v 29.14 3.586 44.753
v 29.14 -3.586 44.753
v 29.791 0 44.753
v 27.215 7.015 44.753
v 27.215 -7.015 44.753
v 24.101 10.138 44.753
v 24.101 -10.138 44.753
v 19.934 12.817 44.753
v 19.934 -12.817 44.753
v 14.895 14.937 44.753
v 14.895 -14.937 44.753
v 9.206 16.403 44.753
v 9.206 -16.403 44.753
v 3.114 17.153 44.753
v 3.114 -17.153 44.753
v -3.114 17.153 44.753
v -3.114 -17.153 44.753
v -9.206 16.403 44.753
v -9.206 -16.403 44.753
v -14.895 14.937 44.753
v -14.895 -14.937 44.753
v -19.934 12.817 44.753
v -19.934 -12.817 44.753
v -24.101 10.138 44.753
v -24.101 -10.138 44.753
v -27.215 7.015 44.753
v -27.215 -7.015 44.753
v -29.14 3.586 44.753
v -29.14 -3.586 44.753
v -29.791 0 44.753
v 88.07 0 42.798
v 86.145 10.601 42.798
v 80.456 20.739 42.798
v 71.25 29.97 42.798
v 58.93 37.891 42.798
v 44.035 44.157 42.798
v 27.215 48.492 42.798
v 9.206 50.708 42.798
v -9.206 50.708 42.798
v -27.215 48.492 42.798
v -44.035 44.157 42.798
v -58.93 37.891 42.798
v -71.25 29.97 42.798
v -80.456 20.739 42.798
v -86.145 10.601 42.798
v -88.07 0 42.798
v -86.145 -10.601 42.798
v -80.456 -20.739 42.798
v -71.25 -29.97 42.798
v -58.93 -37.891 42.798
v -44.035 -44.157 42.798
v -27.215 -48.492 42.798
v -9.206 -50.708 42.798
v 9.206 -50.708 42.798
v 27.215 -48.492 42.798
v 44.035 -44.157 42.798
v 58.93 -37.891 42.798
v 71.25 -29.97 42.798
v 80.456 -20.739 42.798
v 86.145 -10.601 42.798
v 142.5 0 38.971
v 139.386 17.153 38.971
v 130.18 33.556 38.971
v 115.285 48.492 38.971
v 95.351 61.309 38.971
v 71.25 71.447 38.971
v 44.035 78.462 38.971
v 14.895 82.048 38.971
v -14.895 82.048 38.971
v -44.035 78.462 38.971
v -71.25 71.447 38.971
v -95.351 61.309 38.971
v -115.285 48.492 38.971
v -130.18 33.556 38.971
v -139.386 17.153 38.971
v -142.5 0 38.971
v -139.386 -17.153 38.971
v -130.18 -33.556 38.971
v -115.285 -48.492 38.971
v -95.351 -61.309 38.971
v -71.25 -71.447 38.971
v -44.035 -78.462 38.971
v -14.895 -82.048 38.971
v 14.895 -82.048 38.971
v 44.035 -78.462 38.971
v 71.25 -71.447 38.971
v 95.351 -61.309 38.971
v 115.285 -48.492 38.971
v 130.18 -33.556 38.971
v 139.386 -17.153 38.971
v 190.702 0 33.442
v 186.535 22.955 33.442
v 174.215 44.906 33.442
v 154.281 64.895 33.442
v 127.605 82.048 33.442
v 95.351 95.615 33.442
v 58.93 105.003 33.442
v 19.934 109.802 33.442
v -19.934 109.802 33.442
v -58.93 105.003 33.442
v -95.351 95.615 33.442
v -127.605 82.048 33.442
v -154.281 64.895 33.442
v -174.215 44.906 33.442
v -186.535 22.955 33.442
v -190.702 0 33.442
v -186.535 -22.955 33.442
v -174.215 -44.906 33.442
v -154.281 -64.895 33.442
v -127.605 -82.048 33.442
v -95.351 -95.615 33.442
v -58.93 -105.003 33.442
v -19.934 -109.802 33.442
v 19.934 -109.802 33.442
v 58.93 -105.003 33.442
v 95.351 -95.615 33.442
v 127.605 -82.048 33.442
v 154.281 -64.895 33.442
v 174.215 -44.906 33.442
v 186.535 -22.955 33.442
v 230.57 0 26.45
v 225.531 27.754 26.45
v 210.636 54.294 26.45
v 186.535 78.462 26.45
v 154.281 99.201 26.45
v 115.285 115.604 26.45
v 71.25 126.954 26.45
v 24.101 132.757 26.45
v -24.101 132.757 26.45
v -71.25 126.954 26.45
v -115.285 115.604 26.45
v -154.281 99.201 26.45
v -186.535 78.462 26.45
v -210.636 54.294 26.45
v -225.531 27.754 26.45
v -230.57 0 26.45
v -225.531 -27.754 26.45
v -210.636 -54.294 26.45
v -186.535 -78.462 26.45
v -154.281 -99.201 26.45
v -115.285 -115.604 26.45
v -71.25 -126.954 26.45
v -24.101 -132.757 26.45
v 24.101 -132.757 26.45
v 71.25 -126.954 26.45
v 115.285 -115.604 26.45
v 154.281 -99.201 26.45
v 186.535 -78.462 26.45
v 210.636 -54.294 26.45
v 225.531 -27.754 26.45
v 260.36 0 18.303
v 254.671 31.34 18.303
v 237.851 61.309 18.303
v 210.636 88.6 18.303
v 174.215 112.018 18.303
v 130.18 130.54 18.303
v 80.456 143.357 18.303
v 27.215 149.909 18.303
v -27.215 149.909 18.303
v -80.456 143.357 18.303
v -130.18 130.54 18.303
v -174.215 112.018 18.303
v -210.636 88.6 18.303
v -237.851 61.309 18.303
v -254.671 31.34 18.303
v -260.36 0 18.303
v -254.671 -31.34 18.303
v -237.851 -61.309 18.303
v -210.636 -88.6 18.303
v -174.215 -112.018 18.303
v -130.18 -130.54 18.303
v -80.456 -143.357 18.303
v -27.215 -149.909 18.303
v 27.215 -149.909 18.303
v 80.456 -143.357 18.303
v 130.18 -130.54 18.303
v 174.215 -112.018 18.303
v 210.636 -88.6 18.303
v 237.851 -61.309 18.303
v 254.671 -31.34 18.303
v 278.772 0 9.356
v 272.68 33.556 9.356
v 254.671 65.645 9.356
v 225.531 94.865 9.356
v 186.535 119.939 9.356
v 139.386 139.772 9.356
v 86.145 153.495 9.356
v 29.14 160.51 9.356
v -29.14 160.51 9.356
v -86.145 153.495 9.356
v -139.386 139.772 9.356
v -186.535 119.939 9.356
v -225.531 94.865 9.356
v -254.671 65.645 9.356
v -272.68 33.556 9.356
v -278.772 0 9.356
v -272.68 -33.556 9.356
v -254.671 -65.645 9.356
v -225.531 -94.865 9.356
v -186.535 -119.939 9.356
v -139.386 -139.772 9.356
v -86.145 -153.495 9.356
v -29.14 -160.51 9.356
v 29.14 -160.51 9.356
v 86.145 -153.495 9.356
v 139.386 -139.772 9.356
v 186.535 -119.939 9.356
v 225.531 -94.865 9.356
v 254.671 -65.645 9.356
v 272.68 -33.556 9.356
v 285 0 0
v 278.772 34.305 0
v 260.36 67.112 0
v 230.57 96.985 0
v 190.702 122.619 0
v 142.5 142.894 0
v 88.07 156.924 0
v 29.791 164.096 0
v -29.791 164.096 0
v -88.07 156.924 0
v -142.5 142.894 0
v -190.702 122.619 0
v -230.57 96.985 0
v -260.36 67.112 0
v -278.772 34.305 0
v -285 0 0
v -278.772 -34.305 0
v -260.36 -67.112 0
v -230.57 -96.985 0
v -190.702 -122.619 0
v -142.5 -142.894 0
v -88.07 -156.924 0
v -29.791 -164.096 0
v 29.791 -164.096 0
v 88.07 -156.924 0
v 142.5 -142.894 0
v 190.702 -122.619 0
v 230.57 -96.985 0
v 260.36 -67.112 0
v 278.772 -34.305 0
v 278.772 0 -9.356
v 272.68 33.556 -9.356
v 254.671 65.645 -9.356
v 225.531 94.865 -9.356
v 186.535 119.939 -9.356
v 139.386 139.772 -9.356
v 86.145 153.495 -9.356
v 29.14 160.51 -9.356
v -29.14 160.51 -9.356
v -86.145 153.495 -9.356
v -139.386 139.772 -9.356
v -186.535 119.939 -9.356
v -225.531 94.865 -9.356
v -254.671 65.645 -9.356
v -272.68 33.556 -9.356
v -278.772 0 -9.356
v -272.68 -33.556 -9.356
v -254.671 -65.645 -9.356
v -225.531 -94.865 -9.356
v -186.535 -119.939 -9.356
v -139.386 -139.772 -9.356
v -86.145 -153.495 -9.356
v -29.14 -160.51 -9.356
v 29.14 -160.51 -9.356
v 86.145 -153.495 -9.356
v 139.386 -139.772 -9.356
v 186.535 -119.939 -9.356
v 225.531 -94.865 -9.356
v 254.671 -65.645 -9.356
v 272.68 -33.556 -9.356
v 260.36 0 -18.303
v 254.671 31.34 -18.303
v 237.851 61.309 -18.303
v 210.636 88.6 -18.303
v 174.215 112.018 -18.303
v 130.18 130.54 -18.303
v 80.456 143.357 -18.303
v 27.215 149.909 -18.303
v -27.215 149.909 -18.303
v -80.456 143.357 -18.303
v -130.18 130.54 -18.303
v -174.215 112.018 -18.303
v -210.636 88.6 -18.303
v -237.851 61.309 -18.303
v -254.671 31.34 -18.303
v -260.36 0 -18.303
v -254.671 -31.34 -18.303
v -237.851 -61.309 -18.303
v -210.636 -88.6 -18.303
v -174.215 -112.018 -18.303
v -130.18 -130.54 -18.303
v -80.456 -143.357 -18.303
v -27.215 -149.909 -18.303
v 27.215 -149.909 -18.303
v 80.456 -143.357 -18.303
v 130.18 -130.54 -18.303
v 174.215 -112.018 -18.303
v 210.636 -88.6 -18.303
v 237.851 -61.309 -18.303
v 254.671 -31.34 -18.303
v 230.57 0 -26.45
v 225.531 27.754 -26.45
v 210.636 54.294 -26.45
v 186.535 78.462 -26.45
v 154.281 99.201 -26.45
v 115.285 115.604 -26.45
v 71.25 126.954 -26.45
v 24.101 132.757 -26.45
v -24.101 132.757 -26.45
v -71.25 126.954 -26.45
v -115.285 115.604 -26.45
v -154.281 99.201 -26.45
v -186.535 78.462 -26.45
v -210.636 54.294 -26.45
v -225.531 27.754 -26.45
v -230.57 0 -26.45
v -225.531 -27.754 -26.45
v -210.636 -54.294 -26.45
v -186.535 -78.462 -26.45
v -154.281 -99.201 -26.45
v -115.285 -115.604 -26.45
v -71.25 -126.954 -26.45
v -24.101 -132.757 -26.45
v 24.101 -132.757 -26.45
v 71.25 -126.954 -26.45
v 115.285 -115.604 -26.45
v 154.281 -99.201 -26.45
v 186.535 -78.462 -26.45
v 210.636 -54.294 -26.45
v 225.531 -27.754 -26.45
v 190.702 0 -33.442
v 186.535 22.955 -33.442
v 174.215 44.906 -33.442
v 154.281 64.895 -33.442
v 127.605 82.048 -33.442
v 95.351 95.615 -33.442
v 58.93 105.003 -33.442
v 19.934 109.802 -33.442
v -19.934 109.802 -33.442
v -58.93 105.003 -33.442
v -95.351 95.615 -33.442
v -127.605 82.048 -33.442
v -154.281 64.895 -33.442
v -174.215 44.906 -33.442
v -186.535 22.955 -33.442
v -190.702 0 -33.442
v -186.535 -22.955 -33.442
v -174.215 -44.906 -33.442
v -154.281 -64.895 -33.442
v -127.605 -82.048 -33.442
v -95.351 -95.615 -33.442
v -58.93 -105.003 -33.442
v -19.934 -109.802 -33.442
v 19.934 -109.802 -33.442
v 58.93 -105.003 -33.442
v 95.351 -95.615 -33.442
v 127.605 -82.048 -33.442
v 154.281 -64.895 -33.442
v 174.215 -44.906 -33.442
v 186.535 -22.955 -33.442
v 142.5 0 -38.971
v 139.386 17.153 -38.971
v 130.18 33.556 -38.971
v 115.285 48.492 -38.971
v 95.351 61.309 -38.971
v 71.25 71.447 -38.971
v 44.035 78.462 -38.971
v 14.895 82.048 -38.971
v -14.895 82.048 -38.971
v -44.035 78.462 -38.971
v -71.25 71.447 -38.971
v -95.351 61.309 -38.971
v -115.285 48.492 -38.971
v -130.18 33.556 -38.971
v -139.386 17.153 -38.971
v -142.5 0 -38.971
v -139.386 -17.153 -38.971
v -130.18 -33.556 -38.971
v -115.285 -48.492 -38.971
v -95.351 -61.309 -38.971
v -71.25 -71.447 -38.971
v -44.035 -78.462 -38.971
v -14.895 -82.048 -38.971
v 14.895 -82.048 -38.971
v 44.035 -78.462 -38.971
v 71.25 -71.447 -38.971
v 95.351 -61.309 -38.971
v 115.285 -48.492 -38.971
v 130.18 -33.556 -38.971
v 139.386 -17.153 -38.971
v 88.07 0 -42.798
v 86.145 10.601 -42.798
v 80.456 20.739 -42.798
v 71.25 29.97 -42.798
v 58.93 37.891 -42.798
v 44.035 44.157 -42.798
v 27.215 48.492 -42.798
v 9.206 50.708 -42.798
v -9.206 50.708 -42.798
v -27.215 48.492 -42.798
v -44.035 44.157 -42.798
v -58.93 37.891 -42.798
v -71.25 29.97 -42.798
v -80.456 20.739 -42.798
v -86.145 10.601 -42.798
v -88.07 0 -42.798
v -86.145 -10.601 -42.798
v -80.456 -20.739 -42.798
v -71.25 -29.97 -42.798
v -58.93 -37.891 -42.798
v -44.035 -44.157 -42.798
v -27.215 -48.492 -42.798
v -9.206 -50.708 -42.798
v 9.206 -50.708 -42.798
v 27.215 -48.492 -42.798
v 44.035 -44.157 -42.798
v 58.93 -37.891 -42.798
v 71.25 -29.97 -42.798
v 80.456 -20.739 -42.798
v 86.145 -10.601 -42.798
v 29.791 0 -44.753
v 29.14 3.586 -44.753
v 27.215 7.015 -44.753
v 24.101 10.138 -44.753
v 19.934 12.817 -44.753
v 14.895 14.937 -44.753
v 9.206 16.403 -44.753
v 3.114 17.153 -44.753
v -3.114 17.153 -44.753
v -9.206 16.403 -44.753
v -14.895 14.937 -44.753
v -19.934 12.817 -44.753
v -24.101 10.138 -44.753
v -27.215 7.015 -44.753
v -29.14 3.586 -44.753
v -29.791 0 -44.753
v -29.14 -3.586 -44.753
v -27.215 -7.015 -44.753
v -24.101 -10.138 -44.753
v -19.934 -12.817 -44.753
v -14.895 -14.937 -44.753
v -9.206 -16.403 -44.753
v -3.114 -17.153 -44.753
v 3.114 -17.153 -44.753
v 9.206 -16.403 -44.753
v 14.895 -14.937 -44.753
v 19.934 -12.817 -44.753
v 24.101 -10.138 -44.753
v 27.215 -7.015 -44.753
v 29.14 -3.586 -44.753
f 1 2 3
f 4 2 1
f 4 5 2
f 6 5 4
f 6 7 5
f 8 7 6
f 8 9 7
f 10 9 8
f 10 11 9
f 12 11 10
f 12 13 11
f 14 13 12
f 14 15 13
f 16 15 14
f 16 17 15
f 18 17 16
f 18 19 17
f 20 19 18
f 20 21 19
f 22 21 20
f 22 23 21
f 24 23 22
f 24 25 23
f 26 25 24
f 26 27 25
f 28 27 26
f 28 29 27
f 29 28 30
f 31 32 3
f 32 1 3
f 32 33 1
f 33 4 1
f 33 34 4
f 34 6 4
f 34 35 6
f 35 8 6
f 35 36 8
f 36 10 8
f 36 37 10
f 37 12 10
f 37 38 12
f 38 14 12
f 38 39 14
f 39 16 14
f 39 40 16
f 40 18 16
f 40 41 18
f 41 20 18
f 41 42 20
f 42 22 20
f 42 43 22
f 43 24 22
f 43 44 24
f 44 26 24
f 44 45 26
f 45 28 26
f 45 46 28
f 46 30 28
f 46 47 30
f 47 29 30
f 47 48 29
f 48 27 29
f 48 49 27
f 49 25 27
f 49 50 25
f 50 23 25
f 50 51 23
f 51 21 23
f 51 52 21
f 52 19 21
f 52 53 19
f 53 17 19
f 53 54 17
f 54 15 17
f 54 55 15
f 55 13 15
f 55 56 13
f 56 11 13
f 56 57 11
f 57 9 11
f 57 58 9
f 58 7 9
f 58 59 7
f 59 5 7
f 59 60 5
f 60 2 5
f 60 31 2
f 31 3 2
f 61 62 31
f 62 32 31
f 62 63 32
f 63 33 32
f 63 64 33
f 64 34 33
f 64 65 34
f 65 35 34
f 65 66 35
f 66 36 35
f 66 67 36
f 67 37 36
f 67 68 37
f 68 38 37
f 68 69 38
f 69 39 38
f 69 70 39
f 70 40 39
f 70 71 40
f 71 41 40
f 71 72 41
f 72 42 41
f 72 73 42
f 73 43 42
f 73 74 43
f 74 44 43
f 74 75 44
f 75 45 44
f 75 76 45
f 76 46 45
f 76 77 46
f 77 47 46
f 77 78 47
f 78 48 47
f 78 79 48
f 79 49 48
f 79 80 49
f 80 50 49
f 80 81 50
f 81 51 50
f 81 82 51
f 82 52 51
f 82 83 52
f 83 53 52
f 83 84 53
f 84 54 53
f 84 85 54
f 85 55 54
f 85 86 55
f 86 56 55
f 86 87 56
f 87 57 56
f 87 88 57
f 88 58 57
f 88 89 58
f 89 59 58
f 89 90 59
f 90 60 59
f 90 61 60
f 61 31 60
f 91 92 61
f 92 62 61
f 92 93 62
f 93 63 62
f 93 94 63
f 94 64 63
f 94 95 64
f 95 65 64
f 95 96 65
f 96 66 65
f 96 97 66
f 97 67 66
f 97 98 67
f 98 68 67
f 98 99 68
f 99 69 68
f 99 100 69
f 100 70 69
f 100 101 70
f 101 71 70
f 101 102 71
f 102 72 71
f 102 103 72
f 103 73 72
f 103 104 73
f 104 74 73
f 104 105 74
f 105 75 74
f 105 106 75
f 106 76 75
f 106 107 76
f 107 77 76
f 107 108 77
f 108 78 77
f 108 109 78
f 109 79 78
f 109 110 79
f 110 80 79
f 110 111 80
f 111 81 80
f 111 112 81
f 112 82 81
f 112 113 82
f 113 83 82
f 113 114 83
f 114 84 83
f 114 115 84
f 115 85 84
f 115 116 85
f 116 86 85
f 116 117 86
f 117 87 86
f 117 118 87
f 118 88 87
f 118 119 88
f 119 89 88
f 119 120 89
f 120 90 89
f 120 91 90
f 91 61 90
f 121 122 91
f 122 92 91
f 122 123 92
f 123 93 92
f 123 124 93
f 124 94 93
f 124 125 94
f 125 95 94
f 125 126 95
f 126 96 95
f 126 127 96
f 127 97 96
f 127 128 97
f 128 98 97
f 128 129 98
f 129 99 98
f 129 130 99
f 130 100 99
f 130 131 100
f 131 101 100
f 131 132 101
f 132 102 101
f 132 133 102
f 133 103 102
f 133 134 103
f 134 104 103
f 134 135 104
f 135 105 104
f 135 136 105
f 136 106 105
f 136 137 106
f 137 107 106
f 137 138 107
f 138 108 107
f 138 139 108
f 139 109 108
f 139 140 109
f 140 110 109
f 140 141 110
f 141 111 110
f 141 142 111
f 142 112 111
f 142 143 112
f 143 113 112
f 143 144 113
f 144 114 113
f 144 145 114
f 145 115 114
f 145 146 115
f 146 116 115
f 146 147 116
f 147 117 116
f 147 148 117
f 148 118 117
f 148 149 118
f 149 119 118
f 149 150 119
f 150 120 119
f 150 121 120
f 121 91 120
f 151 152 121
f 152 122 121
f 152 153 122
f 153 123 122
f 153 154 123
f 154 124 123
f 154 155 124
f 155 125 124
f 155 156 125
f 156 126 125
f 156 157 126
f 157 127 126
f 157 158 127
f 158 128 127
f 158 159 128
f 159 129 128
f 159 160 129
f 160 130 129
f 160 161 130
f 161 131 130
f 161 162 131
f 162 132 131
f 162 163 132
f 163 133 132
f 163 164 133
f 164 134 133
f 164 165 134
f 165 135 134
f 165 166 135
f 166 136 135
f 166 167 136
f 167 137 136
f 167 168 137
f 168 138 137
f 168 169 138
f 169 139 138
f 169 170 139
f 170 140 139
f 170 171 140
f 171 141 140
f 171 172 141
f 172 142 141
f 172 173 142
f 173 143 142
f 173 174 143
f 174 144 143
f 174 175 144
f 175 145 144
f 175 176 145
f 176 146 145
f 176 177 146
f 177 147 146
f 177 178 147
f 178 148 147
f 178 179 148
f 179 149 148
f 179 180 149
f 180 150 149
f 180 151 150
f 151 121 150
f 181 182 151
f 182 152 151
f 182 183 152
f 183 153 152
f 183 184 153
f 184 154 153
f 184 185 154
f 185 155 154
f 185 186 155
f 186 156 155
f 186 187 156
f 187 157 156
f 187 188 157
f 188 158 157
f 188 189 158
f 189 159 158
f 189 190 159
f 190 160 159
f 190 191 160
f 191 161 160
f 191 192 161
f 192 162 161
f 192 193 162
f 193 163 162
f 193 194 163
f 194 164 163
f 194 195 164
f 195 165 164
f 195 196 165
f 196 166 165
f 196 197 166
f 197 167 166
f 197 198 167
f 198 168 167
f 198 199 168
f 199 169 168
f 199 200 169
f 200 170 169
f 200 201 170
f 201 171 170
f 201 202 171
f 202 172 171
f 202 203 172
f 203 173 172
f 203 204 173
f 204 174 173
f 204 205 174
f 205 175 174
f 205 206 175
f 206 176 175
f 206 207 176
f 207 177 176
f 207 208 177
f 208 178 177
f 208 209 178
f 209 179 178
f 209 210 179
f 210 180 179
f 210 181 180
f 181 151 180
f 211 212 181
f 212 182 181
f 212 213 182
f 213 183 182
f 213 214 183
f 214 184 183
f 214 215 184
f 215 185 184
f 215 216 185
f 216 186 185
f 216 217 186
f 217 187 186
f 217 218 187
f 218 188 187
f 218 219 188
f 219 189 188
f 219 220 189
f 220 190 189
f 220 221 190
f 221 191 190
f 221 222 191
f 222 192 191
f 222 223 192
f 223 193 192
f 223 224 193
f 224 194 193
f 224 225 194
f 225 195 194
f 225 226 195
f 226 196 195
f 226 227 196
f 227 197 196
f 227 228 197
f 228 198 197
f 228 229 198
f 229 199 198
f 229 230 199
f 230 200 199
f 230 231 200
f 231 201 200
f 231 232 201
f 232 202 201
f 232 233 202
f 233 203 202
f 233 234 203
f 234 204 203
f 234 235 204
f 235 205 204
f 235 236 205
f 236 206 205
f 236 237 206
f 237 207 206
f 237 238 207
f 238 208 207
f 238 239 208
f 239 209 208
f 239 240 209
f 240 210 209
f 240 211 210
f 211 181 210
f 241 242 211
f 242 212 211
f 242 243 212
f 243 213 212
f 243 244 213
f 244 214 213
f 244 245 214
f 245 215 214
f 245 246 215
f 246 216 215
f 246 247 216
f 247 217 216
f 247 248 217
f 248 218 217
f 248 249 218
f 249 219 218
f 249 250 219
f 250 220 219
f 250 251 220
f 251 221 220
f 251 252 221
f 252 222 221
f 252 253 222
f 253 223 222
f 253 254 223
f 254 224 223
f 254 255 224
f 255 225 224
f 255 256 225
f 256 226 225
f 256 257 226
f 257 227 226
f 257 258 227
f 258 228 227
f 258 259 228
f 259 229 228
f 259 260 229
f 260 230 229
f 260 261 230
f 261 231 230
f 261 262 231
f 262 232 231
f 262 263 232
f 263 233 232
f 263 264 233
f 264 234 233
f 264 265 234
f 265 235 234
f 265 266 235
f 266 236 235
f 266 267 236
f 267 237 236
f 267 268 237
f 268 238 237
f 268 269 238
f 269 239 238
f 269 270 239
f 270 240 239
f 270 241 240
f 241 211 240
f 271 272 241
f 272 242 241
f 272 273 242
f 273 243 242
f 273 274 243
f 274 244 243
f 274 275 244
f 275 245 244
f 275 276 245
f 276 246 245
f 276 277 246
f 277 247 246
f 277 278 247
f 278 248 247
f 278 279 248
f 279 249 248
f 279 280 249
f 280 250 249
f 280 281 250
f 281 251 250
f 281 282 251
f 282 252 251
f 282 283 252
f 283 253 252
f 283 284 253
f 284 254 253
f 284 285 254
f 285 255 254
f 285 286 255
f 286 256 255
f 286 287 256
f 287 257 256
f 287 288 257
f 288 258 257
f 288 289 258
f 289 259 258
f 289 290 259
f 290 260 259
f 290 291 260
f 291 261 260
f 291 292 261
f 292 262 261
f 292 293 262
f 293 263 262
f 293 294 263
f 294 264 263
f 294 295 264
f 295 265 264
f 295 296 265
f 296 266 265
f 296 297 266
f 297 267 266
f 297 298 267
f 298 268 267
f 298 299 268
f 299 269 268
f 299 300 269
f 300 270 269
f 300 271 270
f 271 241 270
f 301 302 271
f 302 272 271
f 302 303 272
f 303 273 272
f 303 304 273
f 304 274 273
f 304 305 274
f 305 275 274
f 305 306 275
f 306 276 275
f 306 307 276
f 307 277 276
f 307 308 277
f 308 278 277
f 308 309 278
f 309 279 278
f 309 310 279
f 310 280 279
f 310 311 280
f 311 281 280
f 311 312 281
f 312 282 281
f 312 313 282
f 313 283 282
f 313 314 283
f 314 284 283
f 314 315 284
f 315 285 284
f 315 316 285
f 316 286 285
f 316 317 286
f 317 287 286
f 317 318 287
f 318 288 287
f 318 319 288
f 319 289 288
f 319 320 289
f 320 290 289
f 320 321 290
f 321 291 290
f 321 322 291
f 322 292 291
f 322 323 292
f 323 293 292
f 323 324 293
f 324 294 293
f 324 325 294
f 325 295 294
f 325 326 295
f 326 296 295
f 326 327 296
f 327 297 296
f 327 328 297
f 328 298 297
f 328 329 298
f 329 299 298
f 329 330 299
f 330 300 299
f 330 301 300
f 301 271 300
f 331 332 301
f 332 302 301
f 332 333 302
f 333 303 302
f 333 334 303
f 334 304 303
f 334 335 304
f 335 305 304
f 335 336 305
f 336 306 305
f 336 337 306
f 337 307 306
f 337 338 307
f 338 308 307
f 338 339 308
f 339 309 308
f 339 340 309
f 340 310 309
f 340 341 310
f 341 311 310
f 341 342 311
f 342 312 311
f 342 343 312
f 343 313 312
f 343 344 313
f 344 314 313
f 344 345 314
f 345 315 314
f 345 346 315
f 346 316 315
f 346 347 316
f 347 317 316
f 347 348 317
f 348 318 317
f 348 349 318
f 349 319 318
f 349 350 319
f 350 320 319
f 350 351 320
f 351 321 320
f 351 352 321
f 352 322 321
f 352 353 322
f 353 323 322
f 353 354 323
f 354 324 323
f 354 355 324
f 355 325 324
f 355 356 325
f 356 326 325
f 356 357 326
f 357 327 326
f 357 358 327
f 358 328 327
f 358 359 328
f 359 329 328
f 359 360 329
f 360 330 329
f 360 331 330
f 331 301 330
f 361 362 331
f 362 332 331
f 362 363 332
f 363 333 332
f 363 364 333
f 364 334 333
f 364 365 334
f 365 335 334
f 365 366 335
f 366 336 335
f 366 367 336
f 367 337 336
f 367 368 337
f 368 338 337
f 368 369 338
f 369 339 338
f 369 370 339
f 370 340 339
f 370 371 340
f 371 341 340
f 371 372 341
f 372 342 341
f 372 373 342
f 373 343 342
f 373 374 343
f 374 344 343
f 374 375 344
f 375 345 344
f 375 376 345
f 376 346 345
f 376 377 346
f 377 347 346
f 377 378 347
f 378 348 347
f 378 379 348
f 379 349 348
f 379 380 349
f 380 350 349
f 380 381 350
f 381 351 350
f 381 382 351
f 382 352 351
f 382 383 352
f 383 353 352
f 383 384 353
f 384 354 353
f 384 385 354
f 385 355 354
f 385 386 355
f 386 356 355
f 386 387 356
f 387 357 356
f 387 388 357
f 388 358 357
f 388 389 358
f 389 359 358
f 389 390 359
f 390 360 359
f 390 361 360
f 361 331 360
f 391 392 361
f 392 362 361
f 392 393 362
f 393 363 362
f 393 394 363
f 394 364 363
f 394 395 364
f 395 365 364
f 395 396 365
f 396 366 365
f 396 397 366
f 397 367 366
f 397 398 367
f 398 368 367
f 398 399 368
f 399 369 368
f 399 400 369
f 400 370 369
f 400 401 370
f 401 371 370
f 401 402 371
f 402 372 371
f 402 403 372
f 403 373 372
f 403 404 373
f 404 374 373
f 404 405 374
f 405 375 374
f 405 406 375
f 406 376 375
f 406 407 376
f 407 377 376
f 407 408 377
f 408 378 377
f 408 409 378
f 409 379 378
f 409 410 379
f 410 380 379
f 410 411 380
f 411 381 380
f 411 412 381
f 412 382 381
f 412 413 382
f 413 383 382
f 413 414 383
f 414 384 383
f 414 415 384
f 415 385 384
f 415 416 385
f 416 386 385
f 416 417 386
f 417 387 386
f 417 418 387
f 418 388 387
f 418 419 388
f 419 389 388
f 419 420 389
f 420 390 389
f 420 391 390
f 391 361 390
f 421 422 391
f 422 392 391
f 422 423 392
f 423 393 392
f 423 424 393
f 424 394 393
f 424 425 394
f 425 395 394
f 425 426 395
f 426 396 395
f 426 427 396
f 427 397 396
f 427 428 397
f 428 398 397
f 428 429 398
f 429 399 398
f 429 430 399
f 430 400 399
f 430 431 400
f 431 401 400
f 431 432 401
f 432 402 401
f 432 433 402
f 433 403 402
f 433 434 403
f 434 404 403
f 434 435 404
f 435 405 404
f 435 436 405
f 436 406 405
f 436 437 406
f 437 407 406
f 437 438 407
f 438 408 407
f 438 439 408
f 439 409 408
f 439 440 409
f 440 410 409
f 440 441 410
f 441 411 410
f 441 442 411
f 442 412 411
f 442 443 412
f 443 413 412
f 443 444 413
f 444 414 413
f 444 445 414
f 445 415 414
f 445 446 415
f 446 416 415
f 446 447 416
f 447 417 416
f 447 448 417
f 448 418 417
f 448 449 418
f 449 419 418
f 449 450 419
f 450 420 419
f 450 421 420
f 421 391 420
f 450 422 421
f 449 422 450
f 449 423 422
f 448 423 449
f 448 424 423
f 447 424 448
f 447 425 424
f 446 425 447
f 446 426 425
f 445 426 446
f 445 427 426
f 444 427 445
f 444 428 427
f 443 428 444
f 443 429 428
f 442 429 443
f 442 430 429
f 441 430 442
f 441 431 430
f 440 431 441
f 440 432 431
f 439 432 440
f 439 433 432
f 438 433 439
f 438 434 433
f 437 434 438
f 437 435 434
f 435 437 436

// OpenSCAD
// Generated by SolidPython 1.0.1 on 2020-07-29 00:46:54


scale(v = [19, 11, 3]) {
	sphere(r = 15);
}
/***********************************************
*********      SolidPython code:      **********
************************************************
 
# import packages: SolidPython
from solid import *
from solid.utils import *
from itertools import chain, combinations, permutations


class Resize:

    def __init__(self, scad_file):
        self.scad_file = scad_file
        #self.scad_file = import_scad(scad_file)
        # cone/cylinder param:
        self.r1 = 0
        self.r2 = 0
        self.h = 0
        # rectangular prism param:
        self.w = 0
        self.l = 0
        # ellipse param:
        self.r = 0

    # import OpenScad code (file name corresponds to shape)


    # classify shape + parameters
    def assign(self, param1, param2, param3):
        if self.scad_file == 'cone.scad':
            self.r1 = param1
            self.r2 = param2
            self.h = param3
        elif self.scad_file == 'cylinder.scad':
            self.r1 = param1
            self.r2 = param2
            self.h = param3
        elif self.scad_file == 'rectangularPrism.scad':
            self.h = param1
            self.l = param2
            self.w = param3
        else:
            self.r = param1
            self.h = param2

    # resize parameters
    def iterate(self):
        x = range(3, 20, 2)
        i = 1
        if self.scad_file == 'cone.scad':
            tempList = list(permutations(x, 2))
            for temp in tempList:
                param1 = temp[0]
                param2 = temp[1]
                filepath = 'produced_scad_files/' + 'cone' + str(param1) + '_' + str(param2) + '_' + '.scad'
                scad_render_to_file(cylinder(h=param1, r1=param2, r2=0), filepath)

        elif self.scad_file == 'cylinder.scad':
            tempList = list(permutations(x, 3))
            for temp in tempList:
                param1 = temp[0]
                param2 = temp[1]
                filepath = 'produced_scad_files/' + 'cylinder' + str(param1) + '_' + str(param2) + '_' + '.scad'
                scad_render_to_file(cylinder(h=param1, r1=param2, r2=param2), filepath)

        elif self.scad_file == 'rectangularPrism.scad':
            tempList = list(permutations(x, 3))
            for temp in tempList:
                param1 = temp[0]
                param2 = temp[1]
                param3 = temp[2]
                filepath = 'produced_scad_files/' + 'rectangularPrism' + str(param1) + '_' + str(param2) + '_' + str(
                    param3) + '.scad'
                scad_render_to_file(cube(size=(param1, param2, param3)), filepath)

        elif self.scad_file == 'ellipse.scad':
            tempList = list(permutations(x, 4))
            for temp in tempList:
                param1 = temp[0]
                param2 = temp[1]
                param3 = temp[2]
                param4 = temp[3]
                filepath = 'produced_scad_files/' + 'ellipse' + str(param1) + '_' + str(param2) + '_' + str(param3) + '_' + str(param4) + '.scad'
                scad_render_to_file(scale([param1, param2, param3])(sphere(r=param4)), filepath)

    def render_to_scadfile(self):
        scad_render_to_file(scad, 'example.scad') 
 
************************************************/
